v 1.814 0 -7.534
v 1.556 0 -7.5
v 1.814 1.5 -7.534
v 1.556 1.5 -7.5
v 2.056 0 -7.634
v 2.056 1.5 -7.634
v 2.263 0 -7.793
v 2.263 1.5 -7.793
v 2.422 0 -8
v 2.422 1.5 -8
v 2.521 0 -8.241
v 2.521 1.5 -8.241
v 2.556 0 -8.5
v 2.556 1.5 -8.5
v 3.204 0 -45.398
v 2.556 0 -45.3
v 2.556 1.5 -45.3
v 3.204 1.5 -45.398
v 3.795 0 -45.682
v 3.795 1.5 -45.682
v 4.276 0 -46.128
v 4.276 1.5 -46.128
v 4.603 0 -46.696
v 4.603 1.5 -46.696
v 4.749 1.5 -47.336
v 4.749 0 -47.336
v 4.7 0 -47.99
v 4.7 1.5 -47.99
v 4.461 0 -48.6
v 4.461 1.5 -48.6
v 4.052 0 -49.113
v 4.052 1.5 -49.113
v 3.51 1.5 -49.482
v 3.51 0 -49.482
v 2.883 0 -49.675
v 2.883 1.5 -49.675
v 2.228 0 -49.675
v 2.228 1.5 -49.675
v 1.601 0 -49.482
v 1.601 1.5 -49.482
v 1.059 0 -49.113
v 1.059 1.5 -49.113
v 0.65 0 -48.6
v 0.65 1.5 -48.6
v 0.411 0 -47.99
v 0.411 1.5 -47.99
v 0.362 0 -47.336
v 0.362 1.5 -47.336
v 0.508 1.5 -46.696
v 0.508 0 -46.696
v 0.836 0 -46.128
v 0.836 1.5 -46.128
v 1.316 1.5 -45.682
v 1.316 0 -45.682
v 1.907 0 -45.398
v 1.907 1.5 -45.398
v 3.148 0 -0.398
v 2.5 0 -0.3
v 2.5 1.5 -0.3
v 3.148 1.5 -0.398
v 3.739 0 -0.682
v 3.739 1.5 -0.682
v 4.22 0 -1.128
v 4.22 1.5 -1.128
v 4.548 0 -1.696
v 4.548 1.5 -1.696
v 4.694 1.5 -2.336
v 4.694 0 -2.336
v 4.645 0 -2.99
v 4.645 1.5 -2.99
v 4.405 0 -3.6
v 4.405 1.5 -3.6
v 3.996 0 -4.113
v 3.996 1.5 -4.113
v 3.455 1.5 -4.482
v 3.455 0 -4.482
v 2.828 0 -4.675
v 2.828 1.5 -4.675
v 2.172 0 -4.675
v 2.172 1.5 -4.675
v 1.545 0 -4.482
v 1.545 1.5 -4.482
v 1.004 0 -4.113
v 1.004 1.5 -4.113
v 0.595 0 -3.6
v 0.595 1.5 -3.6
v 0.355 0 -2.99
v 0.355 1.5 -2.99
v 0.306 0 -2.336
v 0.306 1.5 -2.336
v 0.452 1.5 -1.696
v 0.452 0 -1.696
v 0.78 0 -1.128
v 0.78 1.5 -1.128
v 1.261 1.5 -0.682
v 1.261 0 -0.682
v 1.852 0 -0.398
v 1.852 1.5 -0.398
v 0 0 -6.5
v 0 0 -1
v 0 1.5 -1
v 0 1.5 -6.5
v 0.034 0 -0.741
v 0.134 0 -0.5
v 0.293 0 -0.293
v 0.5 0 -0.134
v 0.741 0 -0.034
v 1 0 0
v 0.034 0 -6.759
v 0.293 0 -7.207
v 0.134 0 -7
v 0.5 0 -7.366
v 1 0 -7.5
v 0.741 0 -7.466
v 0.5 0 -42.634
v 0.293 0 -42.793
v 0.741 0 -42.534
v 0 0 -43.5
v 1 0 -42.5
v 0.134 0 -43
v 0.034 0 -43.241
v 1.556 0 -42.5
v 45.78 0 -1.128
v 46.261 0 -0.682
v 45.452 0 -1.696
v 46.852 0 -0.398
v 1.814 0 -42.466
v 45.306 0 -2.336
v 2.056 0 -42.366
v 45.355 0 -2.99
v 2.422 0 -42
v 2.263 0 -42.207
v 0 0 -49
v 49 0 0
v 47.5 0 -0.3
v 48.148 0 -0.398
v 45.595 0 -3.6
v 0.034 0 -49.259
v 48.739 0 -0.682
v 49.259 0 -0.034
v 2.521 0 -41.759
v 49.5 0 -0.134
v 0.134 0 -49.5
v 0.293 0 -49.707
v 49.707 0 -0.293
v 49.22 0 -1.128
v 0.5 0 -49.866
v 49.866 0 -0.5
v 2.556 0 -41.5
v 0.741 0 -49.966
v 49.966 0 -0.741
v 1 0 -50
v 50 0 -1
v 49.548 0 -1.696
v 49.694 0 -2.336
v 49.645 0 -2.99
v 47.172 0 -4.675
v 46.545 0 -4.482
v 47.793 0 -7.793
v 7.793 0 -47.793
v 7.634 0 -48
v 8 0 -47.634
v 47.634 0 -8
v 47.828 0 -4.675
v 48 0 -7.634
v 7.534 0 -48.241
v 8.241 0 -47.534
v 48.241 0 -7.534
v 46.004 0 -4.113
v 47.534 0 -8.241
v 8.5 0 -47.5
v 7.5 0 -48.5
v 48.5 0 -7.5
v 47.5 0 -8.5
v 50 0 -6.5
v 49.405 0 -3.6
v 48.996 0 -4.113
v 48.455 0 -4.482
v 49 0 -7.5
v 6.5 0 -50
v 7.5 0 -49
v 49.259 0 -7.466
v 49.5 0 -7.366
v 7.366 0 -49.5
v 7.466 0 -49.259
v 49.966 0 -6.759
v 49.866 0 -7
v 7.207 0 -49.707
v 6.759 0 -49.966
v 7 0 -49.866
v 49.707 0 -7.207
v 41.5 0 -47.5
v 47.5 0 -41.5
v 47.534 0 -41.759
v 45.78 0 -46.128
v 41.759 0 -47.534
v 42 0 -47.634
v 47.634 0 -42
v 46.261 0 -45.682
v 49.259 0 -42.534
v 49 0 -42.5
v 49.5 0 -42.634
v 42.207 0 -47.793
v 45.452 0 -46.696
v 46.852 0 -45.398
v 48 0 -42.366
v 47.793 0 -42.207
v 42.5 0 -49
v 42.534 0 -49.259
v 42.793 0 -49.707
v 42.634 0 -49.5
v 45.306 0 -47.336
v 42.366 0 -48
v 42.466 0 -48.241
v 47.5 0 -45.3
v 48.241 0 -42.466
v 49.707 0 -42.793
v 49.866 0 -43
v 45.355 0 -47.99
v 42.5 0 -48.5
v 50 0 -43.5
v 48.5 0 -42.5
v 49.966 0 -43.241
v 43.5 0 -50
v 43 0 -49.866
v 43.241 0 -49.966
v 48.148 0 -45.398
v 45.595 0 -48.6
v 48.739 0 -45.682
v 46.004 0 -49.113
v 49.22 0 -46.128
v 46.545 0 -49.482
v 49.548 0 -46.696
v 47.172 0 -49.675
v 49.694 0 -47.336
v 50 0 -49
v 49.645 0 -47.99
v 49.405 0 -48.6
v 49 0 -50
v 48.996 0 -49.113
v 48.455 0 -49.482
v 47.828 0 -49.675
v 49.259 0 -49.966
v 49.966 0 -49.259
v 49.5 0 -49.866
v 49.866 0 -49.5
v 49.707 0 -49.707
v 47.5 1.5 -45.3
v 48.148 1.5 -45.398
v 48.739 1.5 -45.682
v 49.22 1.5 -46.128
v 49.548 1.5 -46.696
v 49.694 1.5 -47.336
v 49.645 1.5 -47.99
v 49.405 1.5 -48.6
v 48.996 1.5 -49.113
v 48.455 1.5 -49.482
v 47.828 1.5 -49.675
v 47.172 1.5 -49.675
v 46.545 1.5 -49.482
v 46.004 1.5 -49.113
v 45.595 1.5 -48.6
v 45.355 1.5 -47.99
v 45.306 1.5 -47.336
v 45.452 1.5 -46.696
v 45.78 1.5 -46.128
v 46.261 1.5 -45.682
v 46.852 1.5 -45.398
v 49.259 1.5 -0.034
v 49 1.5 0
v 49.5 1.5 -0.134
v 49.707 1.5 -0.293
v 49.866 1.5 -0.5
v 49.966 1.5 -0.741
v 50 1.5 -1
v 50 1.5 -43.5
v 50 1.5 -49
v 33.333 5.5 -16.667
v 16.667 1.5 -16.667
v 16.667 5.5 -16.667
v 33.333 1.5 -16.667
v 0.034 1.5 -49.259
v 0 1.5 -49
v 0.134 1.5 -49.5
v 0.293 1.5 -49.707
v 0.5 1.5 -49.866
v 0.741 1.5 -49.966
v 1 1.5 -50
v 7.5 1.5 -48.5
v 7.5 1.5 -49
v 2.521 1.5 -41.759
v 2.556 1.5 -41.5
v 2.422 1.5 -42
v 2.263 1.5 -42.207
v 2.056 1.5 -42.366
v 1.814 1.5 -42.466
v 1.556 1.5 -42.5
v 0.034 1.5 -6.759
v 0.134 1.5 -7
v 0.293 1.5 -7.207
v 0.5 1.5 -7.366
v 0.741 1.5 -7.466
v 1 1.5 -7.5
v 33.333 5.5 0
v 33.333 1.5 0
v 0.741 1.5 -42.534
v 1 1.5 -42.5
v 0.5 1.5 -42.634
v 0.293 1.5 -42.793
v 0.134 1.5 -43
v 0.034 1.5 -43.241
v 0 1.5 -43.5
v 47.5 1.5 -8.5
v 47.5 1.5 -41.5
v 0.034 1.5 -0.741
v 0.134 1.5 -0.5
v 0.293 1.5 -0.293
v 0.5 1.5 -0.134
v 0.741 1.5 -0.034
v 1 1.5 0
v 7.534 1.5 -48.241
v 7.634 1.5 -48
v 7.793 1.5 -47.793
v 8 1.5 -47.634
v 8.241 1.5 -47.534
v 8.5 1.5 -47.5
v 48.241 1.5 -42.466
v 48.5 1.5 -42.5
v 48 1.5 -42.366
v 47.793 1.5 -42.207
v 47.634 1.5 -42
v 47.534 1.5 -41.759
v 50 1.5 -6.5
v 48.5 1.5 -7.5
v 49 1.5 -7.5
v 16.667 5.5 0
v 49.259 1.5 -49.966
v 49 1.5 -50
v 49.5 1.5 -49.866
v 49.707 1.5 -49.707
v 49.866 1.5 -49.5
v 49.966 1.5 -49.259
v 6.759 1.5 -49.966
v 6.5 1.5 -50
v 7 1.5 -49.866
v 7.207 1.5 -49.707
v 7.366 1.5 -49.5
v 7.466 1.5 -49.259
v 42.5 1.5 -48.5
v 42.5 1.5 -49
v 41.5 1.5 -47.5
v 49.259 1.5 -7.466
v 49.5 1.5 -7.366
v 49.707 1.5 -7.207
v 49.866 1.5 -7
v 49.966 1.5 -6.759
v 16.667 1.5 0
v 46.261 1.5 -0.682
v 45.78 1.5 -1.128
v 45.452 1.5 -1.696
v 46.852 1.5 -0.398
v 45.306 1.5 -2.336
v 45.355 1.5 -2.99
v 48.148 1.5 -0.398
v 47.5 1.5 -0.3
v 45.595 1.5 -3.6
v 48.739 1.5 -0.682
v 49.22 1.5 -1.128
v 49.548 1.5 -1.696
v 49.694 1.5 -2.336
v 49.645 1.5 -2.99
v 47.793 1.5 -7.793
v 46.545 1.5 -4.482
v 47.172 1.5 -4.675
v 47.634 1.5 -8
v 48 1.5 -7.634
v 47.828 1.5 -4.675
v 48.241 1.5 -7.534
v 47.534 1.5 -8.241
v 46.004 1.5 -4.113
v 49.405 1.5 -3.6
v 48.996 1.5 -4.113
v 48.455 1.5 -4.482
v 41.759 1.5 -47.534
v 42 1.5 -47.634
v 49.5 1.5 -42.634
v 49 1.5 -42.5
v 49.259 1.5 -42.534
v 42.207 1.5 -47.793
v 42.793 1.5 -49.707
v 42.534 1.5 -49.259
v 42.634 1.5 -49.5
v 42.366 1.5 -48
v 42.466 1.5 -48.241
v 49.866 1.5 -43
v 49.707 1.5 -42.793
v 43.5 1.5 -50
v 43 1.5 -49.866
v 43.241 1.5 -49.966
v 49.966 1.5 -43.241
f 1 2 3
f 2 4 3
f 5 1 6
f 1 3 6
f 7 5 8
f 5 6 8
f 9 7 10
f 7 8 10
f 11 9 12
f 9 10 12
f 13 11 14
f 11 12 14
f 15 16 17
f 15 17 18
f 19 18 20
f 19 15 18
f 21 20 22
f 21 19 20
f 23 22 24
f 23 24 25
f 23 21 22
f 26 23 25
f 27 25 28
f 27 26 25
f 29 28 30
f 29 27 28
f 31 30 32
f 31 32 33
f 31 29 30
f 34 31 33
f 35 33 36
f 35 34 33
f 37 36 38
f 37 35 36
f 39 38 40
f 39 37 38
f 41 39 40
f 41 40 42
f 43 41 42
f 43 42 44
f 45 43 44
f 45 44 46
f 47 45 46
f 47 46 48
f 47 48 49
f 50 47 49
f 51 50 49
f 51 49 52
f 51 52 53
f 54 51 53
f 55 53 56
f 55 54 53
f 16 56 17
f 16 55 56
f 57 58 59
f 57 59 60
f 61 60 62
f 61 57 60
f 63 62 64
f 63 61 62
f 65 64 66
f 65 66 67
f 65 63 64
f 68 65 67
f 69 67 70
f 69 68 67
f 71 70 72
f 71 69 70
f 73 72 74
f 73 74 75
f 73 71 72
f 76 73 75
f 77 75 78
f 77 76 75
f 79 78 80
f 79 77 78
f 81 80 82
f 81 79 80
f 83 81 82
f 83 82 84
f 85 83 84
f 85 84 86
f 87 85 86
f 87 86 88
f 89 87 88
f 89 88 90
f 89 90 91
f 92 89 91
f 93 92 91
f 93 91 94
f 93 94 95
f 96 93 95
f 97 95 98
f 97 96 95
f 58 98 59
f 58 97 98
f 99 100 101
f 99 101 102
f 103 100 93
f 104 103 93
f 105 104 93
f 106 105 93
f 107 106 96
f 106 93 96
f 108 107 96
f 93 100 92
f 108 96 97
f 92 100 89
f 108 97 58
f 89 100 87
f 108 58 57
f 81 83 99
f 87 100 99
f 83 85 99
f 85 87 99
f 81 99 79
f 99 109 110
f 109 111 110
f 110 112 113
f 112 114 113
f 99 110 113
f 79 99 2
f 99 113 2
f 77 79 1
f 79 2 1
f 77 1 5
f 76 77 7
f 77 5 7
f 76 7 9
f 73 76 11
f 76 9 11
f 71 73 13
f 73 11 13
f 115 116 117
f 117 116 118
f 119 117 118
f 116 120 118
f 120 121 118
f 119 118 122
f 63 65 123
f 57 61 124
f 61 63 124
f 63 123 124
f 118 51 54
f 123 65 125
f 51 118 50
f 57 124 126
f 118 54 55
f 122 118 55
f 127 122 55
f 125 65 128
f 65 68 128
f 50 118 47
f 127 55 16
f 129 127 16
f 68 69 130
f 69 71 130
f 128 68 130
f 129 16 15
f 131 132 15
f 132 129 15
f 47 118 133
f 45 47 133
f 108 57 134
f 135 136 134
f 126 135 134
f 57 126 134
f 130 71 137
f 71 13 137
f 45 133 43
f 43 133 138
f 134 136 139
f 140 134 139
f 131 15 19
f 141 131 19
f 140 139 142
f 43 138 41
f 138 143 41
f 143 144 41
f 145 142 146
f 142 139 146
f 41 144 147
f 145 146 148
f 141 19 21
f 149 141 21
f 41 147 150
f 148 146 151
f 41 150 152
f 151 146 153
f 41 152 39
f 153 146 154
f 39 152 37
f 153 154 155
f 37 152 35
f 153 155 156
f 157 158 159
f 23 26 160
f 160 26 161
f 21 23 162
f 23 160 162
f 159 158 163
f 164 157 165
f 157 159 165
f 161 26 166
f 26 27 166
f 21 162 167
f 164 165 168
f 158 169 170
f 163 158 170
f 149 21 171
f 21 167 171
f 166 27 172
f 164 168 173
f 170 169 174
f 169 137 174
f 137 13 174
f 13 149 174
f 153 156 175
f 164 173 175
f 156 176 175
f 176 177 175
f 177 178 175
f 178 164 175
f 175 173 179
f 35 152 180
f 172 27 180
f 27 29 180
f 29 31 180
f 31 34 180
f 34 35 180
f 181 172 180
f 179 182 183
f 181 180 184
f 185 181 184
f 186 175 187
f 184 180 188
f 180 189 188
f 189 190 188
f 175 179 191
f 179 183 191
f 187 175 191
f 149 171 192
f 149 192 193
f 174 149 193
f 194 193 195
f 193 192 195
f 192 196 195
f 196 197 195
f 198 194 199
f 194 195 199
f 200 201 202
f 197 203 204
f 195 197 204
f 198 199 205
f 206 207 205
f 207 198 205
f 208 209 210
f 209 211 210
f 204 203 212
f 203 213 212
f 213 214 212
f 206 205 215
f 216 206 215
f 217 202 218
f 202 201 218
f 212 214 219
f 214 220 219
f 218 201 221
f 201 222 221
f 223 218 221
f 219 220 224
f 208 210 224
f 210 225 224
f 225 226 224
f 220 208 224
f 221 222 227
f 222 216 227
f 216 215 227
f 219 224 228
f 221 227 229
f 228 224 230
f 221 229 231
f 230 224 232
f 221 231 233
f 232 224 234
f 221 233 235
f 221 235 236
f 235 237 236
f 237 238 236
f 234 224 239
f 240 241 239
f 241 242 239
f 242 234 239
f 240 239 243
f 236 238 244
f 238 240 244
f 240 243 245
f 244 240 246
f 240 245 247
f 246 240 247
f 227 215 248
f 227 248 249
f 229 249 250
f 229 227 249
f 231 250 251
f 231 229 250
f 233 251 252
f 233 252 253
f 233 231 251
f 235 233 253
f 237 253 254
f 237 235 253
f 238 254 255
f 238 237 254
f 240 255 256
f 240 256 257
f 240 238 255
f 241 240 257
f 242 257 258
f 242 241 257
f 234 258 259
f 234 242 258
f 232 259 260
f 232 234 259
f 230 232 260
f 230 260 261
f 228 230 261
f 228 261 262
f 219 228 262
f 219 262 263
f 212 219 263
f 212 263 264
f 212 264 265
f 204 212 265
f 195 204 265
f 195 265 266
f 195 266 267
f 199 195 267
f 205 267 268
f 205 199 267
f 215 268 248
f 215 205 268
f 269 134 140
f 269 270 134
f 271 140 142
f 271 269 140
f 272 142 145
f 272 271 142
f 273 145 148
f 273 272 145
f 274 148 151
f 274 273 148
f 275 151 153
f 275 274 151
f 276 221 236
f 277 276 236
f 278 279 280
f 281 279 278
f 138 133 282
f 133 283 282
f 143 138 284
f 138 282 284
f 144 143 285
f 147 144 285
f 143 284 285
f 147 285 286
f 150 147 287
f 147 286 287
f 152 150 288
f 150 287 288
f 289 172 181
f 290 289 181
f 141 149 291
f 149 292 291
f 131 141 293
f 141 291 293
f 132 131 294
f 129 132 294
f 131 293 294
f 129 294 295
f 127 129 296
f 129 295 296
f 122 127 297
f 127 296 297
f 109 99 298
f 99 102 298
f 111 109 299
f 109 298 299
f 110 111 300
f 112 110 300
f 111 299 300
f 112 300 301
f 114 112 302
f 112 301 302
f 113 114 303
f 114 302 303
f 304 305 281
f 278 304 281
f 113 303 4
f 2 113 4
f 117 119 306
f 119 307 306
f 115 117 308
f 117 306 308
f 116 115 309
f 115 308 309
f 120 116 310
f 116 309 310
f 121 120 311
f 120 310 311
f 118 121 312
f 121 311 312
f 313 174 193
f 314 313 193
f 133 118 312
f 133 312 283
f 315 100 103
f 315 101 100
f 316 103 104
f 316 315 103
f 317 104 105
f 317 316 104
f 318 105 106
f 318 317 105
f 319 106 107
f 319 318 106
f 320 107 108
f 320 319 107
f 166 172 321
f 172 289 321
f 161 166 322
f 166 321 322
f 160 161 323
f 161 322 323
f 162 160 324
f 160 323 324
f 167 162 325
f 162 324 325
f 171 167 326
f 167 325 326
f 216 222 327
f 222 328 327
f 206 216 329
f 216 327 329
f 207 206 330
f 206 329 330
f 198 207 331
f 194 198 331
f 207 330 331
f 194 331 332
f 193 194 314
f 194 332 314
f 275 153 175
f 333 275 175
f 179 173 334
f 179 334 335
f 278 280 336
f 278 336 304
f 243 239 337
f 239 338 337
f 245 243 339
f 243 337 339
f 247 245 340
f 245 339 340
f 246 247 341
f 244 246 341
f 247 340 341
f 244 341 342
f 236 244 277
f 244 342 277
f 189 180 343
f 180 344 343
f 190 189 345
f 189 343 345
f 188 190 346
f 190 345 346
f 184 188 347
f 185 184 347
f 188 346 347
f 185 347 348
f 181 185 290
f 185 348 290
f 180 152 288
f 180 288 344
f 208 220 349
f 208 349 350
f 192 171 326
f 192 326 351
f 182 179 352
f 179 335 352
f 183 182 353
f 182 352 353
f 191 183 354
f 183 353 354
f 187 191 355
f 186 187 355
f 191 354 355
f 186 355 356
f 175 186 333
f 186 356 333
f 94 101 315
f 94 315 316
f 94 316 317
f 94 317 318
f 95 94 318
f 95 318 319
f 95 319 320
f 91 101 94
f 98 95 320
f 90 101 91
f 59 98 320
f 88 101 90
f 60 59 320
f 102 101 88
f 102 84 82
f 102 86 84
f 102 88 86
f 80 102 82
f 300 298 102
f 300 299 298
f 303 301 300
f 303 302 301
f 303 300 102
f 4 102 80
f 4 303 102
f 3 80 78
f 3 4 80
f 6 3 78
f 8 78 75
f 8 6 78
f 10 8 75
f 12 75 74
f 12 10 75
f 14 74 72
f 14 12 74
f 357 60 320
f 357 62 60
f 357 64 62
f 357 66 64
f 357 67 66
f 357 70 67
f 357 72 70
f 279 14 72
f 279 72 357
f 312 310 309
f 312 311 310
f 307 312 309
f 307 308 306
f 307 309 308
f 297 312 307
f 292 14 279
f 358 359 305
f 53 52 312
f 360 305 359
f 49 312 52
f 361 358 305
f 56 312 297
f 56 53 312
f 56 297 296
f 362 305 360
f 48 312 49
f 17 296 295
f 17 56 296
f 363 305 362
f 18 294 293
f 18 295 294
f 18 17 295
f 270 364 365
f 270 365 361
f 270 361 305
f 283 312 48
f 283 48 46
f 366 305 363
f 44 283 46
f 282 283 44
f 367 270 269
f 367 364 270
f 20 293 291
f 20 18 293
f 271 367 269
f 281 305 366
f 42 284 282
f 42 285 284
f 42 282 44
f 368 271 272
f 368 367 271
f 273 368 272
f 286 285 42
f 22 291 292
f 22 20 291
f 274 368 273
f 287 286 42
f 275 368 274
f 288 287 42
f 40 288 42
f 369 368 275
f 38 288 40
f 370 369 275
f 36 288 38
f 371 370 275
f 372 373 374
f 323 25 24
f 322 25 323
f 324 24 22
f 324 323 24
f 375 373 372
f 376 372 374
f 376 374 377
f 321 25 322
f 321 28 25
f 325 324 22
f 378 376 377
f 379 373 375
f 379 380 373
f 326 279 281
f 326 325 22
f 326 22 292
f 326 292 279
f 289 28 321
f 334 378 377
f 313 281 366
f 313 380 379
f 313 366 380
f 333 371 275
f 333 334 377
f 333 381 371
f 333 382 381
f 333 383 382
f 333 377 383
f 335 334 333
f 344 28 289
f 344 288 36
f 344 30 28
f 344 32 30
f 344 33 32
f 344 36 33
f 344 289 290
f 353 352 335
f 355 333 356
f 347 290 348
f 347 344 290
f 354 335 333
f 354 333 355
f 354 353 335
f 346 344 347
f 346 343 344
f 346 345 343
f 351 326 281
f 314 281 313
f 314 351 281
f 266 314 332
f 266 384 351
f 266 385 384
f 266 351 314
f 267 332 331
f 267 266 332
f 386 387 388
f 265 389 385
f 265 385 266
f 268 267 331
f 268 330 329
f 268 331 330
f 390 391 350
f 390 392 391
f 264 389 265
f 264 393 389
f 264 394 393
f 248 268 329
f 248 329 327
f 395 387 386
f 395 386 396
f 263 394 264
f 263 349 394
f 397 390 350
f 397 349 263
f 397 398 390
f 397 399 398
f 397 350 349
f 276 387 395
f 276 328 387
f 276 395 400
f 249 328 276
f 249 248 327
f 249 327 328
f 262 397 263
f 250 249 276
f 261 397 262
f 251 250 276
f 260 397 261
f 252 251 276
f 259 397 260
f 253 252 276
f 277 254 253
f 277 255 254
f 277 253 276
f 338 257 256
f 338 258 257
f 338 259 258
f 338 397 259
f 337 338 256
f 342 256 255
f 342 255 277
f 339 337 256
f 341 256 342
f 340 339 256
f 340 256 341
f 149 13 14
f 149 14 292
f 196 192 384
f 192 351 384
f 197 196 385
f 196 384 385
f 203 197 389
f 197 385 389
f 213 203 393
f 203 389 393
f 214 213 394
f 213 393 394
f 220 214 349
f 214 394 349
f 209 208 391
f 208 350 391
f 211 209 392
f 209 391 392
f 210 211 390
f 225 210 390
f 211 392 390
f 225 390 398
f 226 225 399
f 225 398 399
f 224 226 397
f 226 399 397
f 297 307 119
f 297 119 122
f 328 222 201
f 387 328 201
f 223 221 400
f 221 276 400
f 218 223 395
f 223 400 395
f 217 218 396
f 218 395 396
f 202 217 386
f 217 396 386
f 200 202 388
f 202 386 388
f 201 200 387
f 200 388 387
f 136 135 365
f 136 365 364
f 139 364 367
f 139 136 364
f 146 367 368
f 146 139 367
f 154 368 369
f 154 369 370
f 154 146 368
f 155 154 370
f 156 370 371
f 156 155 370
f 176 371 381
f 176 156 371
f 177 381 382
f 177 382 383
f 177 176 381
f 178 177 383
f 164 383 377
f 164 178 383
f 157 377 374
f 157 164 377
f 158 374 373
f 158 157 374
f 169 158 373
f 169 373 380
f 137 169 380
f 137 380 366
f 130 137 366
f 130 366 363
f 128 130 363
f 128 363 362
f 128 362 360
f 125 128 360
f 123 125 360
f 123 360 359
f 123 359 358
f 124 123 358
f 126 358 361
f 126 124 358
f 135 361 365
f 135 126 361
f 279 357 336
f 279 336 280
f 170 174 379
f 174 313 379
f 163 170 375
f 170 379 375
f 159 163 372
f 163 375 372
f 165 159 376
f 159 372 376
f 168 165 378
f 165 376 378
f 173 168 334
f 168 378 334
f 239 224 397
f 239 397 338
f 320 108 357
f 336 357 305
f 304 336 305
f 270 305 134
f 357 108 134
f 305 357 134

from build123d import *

# Parameters (mm, degrees)
SKETCH1_W           = 50
SKETCH1_H           = 50
SKETCH1_R           = 2.2
BOSS_EXTRUDE1_DEPTH = 1.5
SKETCH3_W           = 2.555545098
SKETCH3_H           = 35
SKETCH3_W_2         = 2.5
SKETCH3_W_3         = 35
SKETCH3_H_2         = 2.5
CUT_EXTRUDE1_DEPTH  = 1.5
FILLET8_R           = 1
SKETCH4_W           = 16.6666
SKETCH4_H           = 16.6666
BOSS_EXTRUDE2_DEPTH = 4


with BuildPart() as part:
    # Sketch1 → Boss-Extrude1 (new body)
    with BuildSketch(Plane(origin=(0, 0, 0), x_dir=(1, 0, 0), z_dir=(0, 1, 0))):
        with Locations((25, 25)):
            Rectangle(SKETCH1_W, SKETCH1_H)
        with Locations(Location((2.555545098, 47.5, 0), (0, 0, 270))):
            Circle(SKETCH1_R, mode=Mode.SUBTRACT)
        with Locations(Location((47.5, 47.5, 0), (0, 0, 270))):
            Circle(SKETCH1_R, mode=Mode.SUBTRACT)
        with Locations(Location((2.5, 2.5, 0), (0, 0, 270))):
            Circle(SKETCH1_R, mode=Mode.SUBTRACT)
        with Locations(Location((47.5, 2.5, 0), (0, 0, 270))):
            Circle(SKETCH1_R, mode=Mode.SUBTRACT)
    extrude(amount=BOSS_EXTRUDE1_DEPTH)

    # Sketch3 → Cut-Extrude1 (cut)
    with BuildSketch(Plane(origin=(0, 0, 0), x_dir=(1, 0, 0), z_dir=(0, 1, 0))):
        with Locations((1.277772549, 25)):
            Rectangle(SKETCH3_W, SKETCH3_H)
        with Locations((48.75, 25)):
            Rectangle(SKETCH3_W_2, SKETCH3_H)
        with Locations((25, 48.75)):
            Rectangle(SKETCH3_W_3, SKETCH3_H_2)
    extrude(amount=CUT_EXTRUDE1_DEPTH, mode=Mode.SUBTRACT)

    # Fillet8
    fillet8_edges = [part.edges().sort_by_distance(p)[0] for p in [
        (0, 0.75, -7.5),
        (2.555545098, 0.75, -7.5),
        (2.555545098, 0.75, -42.5),
        (0, 0.75, -42.5),
        (47.5, 0.75, -7.5),
        (50, 0.75, -7.5),
        (50, 0.75, -42.5),
        (47.5, 0.75, -42.5),
        (7.5, 0.75, -47.5),
        (42.5, 0.75, -47.5),
        (42.5, 0.75, -50),
        (7.5, 0.75, -50),
        (0, 0.75, -50),
        (50, 0.75, -50),
        (50, 0.75, 0),
        (0, 0.75, 0),
    ]]
    fillet(fillet8_edges, radius=FILLET8_R)

    # Sketch4 → Boss-Extrude2 (add)
    with BuildSketch(Plane(origin=(0, 1.5, 0), x_dir=(1, 0, 0), z_dir=(0, 1, 0))):
        with Locations((25, 8.3333)):
            Rectangle(SKETCH4_W, SKETCH4_H)
    extrude(amount=BOSS_EXTRUDE2_DEPTH)


solid = part.part
